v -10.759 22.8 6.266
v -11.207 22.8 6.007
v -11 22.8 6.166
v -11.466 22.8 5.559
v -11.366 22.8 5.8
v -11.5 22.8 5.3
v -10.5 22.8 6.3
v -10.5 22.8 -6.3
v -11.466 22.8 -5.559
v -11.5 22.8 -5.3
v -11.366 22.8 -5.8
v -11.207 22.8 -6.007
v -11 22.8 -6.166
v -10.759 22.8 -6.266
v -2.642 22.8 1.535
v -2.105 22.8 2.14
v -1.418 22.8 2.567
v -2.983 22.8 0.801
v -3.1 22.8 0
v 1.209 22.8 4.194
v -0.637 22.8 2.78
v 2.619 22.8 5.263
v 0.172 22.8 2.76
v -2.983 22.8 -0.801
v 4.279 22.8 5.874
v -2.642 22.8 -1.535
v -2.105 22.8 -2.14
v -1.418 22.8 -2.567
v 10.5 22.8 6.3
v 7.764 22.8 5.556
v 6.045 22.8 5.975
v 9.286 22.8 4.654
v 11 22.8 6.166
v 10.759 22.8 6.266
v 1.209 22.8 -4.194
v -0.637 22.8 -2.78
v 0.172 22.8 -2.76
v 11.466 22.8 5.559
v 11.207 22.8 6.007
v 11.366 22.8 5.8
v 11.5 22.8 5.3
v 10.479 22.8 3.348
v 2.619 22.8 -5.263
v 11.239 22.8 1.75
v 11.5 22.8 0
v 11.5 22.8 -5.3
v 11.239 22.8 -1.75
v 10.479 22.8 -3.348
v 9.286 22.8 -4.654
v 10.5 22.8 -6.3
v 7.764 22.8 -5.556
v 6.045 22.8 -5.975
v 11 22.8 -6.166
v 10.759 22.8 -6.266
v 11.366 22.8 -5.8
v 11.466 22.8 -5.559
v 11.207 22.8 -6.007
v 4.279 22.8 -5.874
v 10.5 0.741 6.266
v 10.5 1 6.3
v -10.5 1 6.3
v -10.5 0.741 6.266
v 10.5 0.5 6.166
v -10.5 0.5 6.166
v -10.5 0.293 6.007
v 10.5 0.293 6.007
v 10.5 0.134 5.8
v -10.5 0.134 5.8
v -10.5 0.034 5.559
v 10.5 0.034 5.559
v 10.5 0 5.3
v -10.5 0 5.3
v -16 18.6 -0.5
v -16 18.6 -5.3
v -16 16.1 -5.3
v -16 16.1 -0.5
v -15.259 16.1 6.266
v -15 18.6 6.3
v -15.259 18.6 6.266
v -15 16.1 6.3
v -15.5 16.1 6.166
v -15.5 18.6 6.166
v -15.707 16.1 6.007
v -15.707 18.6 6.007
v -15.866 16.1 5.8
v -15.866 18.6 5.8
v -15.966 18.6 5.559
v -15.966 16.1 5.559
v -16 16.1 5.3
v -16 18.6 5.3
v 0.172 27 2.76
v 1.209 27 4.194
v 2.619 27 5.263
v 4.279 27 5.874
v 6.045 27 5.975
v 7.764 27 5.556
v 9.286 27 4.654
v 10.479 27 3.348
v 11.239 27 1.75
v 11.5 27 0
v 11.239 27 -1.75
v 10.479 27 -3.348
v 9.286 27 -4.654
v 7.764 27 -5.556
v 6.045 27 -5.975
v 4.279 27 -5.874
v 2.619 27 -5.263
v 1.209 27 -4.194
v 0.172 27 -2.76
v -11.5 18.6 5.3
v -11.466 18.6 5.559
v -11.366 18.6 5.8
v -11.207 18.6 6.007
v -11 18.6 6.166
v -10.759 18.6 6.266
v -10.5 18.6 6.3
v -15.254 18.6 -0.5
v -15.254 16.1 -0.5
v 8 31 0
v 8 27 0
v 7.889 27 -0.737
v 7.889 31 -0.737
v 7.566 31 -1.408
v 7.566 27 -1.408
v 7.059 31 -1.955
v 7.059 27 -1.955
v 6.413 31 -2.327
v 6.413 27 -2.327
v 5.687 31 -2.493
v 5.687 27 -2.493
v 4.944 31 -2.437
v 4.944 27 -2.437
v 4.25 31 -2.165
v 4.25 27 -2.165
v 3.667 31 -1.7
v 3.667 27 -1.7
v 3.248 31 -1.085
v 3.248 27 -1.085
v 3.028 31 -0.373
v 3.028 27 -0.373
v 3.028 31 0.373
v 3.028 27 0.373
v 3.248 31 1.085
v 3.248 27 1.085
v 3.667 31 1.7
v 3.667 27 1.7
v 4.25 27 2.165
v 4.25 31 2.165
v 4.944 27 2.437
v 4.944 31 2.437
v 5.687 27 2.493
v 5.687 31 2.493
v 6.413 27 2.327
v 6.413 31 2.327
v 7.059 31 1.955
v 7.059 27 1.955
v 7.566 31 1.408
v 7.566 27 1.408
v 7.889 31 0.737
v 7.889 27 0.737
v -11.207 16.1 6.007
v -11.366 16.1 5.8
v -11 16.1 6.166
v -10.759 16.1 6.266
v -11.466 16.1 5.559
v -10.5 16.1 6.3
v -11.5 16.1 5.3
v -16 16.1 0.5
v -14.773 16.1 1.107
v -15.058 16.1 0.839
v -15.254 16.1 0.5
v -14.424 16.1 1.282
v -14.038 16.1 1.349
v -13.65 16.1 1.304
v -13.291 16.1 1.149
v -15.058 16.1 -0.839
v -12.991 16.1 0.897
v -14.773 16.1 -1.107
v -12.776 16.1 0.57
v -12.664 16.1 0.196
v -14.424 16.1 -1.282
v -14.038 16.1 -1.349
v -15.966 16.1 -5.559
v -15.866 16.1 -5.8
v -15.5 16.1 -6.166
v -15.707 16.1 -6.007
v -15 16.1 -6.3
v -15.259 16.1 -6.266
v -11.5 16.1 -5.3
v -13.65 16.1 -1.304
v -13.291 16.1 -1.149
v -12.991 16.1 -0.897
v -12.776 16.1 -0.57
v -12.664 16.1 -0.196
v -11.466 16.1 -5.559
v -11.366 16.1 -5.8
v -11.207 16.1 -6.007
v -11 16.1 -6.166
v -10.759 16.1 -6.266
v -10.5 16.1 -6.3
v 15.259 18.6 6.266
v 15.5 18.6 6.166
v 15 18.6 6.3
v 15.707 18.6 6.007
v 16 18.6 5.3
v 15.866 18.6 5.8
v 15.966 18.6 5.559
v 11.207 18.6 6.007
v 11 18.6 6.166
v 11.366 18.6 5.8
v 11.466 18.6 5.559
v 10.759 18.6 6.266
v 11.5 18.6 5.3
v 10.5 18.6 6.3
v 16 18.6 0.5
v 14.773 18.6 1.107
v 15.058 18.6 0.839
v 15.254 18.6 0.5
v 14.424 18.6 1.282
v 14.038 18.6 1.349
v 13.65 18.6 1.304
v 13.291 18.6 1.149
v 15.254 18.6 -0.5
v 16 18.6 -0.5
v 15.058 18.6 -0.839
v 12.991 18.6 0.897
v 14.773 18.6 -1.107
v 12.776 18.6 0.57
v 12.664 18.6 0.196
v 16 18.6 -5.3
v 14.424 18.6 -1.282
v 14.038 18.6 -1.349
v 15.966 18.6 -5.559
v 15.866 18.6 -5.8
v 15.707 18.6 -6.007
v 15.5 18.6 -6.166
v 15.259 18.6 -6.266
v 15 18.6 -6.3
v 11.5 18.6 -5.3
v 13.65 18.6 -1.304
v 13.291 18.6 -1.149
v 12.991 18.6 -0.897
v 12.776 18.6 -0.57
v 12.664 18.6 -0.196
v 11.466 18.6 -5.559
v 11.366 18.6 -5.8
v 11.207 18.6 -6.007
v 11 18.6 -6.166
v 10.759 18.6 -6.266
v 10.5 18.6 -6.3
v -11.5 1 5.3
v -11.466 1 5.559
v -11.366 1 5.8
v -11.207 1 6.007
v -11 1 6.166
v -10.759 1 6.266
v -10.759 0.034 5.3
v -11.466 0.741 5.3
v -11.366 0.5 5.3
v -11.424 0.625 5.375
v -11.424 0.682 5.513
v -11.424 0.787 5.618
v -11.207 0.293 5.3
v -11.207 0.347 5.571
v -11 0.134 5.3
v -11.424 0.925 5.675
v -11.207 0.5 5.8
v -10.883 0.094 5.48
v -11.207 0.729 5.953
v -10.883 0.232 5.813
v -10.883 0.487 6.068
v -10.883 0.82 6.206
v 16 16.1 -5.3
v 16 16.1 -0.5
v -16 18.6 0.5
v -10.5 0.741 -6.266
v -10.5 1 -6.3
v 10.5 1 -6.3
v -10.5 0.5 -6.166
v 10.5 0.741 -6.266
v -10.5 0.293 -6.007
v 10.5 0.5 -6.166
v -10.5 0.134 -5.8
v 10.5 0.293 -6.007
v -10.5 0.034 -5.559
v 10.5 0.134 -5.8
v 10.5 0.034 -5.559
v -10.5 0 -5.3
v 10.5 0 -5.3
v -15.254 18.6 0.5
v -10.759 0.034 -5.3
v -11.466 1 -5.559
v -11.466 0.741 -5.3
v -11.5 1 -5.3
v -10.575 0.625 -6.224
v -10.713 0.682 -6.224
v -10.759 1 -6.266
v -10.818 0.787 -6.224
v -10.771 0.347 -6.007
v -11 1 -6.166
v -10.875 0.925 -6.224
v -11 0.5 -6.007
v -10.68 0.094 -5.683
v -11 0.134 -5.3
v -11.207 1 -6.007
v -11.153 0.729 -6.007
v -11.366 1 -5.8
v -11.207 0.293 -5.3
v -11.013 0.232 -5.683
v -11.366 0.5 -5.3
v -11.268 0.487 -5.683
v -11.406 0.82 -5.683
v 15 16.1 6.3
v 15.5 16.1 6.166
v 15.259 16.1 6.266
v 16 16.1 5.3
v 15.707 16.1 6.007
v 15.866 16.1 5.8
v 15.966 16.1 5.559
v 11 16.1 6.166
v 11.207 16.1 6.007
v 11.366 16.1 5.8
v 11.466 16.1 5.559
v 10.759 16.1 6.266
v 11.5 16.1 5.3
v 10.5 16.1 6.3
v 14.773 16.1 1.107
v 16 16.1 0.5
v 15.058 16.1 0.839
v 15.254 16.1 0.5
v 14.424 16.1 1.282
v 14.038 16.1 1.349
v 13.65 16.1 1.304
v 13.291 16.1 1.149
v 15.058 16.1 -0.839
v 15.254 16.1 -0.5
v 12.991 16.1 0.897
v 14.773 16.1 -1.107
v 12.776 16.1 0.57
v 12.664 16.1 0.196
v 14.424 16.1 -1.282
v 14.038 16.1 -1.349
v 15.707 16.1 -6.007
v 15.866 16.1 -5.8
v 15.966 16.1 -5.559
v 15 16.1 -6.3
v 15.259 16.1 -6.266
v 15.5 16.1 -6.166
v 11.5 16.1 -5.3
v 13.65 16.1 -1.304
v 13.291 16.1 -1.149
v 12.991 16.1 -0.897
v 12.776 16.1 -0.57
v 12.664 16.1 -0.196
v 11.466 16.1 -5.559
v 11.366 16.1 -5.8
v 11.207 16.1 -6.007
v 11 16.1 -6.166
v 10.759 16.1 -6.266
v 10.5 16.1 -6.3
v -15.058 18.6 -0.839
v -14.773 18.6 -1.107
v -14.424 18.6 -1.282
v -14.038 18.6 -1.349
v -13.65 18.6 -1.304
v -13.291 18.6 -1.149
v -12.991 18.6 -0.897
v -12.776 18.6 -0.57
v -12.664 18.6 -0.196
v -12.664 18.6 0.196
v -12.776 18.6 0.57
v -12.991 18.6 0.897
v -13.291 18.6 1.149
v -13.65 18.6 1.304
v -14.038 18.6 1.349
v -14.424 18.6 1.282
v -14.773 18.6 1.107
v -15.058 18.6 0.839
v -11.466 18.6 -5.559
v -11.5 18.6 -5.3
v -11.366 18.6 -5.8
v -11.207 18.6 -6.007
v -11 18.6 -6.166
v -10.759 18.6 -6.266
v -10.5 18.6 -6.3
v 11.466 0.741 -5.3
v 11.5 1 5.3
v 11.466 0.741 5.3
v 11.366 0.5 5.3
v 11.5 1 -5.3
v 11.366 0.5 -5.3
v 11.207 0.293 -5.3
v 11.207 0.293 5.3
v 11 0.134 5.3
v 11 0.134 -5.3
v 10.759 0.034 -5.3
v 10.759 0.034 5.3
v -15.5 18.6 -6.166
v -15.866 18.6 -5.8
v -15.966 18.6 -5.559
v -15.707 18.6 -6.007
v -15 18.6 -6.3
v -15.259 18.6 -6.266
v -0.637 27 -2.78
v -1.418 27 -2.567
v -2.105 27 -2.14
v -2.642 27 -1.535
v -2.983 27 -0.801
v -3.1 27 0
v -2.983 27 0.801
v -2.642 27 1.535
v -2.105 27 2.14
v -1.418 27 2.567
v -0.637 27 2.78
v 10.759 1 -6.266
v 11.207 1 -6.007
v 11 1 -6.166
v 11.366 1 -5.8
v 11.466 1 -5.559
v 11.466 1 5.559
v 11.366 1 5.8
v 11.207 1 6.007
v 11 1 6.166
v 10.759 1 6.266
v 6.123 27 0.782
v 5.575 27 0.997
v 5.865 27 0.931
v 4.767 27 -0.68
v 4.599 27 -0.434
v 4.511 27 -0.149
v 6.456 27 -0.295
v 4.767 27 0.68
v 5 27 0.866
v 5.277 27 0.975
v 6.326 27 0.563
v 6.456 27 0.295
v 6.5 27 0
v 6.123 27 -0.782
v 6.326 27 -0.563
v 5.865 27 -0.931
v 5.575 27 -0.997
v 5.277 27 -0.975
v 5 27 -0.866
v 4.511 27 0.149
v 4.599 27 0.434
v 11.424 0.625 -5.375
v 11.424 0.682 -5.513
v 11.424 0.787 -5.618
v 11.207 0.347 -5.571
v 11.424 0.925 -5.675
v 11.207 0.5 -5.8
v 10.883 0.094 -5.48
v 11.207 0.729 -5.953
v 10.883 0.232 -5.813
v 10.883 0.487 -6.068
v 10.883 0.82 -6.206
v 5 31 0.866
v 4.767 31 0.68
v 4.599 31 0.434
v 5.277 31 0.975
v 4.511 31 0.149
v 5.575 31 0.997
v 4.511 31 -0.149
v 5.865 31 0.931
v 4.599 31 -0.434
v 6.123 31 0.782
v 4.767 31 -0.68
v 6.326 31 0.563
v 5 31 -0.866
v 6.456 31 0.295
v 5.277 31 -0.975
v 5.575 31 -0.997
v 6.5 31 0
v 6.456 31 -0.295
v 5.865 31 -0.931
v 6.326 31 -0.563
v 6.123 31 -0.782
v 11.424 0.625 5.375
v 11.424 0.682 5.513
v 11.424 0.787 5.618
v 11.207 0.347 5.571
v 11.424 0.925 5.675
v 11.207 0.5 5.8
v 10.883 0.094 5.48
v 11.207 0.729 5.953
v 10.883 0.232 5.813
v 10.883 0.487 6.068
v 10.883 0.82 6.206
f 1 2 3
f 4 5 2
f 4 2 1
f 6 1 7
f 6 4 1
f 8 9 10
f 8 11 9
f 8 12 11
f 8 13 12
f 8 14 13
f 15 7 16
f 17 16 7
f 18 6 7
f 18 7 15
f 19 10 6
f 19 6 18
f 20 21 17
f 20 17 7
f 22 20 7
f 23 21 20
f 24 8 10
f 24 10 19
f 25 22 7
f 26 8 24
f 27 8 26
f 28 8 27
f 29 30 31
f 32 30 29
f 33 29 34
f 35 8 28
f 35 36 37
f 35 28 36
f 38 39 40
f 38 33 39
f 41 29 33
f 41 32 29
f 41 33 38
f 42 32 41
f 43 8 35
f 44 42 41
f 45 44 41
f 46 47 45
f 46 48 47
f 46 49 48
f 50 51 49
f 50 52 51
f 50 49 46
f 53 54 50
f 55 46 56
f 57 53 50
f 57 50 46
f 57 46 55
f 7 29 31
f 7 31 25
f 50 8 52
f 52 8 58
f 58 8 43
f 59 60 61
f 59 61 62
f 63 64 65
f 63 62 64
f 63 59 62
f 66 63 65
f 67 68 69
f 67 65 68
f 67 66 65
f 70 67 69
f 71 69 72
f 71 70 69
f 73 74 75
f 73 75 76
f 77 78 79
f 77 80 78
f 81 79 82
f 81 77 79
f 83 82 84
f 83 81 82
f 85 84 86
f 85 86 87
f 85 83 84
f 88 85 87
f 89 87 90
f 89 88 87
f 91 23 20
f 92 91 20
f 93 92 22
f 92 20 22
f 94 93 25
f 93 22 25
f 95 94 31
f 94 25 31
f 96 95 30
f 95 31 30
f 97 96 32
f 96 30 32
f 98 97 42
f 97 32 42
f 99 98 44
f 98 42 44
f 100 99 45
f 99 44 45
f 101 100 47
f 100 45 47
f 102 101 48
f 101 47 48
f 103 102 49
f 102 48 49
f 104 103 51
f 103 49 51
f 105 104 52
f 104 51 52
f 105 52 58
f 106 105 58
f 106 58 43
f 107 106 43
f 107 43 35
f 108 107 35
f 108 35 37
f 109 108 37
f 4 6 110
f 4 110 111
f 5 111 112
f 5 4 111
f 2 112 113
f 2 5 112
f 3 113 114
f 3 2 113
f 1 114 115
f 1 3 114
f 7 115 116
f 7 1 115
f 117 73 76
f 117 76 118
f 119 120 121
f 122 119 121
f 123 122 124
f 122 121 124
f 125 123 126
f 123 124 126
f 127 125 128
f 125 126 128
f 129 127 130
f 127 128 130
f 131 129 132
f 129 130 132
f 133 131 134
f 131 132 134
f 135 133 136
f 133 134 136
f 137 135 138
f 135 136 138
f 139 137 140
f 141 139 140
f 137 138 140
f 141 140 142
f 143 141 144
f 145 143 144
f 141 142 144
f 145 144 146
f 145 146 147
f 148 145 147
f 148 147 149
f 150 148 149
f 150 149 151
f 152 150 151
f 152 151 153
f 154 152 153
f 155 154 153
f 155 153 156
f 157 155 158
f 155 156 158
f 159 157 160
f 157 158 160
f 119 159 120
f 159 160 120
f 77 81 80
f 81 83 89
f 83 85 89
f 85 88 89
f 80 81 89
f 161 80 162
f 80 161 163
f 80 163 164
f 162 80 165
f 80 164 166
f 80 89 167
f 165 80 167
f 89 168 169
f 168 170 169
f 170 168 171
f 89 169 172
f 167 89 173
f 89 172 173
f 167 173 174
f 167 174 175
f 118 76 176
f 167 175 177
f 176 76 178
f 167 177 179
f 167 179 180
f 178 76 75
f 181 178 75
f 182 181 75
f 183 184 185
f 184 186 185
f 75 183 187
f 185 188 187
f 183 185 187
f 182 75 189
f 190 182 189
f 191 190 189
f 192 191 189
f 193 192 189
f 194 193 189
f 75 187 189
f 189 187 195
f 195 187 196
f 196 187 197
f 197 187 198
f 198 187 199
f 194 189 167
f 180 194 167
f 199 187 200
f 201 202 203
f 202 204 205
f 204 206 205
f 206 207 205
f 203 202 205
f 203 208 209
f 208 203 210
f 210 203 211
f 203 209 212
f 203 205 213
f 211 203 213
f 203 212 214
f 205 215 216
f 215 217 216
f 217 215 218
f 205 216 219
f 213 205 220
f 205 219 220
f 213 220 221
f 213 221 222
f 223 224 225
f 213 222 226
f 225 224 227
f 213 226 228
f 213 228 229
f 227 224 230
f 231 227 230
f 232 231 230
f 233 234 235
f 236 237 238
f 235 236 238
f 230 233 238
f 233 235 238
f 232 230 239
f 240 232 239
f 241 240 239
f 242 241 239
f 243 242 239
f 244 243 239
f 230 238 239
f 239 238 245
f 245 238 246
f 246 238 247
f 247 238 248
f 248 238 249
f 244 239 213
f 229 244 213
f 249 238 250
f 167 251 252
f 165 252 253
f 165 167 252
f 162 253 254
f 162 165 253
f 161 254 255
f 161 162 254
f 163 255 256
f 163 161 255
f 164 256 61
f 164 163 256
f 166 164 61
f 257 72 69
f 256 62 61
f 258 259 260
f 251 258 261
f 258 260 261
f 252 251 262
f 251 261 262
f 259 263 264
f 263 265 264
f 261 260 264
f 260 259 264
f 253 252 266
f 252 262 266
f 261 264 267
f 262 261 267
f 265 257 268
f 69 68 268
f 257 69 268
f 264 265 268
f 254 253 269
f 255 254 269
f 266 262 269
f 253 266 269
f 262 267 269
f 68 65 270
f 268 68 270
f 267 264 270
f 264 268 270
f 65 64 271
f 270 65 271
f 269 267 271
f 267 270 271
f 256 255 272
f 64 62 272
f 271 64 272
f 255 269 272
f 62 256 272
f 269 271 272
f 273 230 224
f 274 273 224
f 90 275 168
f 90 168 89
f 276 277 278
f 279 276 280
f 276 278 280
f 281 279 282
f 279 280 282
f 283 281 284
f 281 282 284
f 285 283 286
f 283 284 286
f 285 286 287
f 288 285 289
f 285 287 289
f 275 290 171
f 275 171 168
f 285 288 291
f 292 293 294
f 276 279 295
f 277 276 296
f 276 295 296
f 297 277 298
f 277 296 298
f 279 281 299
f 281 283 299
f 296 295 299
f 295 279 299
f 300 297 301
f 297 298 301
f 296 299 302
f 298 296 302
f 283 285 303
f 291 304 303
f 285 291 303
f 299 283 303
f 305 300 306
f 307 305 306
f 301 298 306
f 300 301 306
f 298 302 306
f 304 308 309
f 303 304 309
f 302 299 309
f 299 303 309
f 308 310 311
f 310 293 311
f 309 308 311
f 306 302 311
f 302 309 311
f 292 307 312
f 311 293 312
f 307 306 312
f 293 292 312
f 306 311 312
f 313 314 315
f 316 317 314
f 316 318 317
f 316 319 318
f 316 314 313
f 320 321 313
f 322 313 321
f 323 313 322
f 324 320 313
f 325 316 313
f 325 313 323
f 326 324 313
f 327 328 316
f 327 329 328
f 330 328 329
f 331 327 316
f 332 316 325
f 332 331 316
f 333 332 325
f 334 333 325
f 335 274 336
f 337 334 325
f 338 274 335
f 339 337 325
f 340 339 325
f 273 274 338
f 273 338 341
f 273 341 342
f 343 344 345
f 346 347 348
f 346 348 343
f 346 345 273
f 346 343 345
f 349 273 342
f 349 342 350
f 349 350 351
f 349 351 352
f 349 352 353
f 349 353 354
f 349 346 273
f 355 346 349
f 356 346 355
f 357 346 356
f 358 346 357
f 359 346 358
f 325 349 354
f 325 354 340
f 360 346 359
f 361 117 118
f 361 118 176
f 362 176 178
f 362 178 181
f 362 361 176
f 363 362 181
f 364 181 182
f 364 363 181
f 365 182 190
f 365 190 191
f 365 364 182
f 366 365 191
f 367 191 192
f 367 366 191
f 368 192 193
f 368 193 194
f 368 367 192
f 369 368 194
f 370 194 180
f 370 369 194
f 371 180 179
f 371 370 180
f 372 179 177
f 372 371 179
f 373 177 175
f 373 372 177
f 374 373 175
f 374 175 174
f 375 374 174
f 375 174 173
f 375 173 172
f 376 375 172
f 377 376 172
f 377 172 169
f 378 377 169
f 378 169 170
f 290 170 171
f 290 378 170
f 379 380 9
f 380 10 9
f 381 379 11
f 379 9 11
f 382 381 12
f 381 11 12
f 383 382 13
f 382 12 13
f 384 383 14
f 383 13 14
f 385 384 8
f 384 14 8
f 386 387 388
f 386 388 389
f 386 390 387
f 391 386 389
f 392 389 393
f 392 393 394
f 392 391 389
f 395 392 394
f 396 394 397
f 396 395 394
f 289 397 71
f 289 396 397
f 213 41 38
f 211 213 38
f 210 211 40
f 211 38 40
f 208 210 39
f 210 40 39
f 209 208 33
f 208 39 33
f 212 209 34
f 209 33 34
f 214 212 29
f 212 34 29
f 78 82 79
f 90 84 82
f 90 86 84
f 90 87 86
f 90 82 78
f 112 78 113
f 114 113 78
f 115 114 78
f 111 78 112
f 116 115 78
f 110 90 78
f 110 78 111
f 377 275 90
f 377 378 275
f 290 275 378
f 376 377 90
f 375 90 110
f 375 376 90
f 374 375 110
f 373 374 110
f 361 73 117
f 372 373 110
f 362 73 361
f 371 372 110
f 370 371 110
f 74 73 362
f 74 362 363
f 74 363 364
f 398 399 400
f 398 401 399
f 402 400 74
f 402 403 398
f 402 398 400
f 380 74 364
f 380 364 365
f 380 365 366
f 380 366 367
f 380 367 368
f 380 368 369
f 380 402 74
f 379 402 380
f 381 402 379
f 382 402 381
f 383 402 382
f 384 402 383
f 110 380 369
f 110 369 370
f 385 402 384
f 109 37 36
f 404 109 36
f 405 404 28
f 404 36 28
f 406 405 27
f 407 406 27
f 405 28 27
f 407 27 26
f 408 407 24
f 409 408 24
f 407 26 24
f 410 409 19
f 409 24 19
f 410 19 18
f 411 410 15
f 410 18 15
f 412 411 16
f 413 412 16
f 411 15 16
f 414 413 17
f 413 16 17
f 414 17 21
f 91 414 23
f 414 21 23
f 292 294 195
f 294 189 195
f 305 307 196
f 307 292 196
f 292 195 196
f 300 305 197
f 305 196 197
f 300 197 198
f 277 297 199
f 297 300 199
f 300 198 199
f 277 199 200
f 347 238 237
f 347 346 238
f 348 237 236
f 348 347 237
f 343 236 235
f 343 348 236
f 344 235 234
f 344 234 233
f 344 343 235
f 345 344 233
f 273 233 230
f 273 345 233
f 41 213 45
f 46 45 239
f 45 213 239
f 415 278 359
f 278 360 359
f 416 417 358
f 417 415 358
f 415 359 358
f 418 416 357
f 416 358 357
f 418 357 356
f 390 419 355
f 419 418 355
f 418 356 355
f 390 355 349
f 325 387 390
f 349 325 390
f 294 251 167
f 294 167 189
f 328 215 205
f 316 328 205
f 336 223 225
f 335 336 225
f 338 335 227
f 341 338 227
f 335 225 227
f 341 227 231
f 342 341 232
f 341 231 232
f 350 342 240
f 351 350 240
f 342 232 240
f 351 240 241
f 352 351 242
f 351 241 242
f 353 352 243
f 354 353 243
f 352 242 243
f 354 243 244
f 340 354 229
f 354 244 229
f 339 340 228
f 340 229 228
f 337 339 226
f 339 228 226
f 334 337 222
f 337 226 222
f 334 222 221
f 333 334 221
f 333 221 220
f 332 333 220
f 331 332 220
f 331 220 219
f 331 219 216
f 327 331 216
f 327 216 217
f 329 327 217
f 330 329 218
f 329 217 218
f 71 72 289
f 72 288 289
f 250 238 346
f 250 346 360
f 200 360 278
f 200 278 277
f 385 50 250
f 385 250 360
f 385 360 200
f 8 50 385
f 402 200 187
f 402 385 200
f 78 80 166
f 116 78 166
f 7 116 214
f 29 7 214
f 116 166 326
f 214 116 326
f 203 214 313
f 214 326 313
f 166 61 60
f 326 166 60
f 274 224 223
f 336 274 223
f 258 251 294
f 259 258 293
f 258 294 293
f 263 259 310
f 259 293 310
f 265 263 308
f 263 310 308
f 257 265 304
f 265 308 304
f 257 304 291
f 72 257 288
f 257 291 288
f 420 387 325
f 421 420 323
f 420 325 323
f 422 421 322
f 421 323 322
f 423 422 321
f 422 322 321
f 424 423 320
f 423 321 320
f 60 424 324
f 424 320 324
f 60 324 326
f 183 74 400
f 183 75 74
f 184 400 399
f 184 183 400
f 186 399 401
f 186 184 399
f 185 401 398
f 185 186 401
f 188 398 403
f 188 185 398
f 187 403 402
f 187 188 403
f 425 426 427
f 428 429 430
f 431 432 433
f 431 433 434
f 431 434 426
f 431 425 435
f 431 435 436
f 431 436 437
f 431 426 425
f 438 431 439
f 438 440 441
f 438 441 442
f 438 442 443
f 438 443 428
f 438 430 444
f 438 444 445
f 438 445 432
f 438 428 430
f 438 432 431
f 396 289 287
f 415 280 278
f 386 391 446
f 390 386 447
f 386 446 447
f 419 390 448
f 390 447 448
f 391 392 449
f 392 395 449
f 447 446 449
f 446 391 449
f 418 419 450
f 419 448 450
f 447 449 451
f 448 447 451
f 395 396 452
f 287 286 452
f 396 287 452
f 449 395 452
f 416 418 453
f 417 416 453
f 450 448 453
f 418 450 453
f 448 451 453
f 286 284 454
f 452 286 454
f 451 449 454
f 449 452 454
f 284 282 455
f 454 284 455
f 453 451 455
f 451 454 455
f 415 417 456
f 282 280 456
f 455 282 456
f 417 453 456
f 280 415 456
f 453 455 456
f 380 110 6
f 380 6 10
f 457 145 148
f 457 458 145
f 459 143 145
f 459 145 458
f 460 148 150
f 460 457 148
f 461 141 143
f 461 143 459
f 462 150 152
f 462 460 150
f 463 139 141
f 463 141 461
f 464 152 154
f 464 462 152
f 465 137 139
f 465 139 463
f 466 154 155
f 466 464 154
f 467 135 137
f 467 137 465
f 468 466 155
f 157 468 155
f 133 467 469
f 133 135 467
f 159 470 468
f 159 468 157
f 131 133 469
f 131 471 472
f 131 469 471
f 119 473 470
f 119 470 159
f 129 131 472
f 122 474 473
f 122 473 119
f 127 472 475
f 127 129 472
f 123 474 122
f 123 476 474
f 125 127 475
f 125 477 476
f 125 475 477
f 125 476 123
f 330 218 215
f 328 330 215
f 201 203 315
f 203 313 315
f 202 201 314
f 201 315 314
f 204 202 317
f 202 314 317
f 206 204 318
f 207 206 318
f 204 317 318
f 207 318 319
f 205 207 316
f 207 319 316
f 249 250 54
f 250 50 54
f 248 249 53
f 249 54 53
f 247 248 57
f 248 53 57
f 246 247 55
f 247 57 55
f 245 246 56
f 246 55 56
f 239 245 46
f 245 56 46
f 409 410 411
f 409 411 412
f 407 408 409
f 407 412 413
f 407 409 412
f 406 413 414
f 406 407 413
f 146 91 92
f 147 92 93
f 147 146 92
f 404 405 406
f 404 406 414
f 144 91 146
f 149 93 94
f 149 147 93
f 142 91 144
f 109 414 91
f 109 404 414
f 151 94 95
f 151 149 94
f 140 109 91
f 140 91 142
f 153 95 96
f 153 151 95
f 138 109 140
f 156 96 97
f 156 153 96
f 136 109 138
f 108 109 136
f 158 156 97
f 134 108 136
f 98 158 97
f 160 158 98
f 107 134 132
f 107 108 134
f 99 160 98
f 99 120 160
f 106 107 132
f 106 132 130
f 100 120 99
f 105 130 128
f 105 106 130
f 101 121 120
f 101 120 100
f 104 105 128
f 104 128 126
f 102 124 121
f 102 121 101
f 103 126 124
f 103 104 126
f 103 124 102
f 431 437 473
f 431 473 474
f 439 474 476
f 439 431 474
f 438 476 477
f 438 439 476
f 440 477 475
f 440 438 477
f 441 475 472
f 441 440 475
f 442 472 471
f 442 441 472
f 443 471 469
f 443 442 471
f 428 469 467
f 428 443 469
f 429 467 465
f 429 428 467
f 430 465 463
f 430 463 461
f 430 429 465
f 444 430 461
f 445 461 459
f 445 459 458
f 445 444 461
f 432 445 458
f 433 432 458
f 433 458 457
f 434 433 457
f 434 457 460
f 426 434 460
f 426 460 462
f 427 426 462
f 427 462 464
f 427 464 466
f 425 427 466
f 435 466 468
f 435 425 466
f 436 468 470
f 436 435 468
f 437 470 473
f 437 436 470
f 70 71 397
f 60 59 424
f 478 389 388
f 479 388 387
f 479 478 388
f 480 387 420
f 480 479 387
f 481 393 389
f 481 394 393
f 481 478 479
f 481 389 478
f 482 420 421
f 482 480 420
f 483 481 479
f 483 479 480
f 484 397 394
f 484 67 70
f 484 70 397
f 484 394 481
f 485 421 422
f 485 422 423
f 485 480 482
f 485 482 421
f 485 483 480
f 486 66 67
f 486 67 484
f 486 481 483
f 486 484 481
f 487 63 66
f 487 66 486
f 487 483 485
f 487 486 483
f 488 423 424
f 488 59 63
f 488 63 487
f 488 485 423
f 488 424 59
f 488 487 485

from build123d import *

# Parameters (mm, degrees)
SKETCH1_W            = 23
SKETCH1_H            = 12.6
BOSS_EXTRUDE1_DEPTH  = 22.8
BOSS_EXTRUDE2_DEPTH  = 4.2
SKETCH3_R            = 2.5
SKETCH3_R_2          = 1
EXTRUDE_THIN1_DEPTH  = 4
FILLET1_R            = 1
BOSS_EXTRUDE4_START  = -4.2
BOSS_EXTRUDE4_DEPTH  = 2.5
FILLET2_R            = 1
FILLET2_OF_MIRROR1_R = 1


with BuildPart() as part:
    # Sketch1 → Boss-Extrude1 (new body)
    with BuildSketch(Plane(origin=(0, 0, 0), x_dir=(1, 0, 0), z_dir=(0, 1, 0))):
        Rectangle(SKETCH1_W, SKETCH1_H)
    extrude(amount=BOSS_EXTRUDE1_DEPTH)

    # Sketch2 → Boss-Extrude2 (add)
    with BuildSketch(Plane(origin=(0, 22.8, 0), x_dir=(1, 0, 0), z_dir=(0, 1, 0))):
        with BuildLine():
            ThreePointArc((0.172413793, -2.759859636), (11.5, 0), (0.172413793, 2.759859636))
            ThreePointArc((0.172413793, 2.759859636), (-3.1, 0), (0.172413793, -2.759859636))
        make_face()
    extrude(amount=BOSS_EXTRUDE2_DEPTH)

    # Sketch3 → Extrude-Thin1 (add)
    with BuildSketch(Plane(origin=(0, 27, 0), x_dir=(1, 0, 0), z_dir=(0, 1, 0))):
        with Locations((5.5, 0)):
            Circle(SKETCH3_R)
        with Locations((5.5, 0)):
            Circle(SKETCH3_R_2, mode=Mode.SUBTRACT)
    extrude(amount=EXTRUDE_THIN1_DEPTH)

    # Fillet1
    fillet1_edges = [part.edges().sort_by_distance(p)[0] for p in [
        (0, 0, 6.3),
        (-11.5, 0, 0),
        (0, 0, -6.3),
        (11.5, 0, 0),
        (11.5, 11.4, 6.3),
        (-11.5, 11.4, 6.3),
        (-11.5, 11.4, -6.3),
        (11.5, 11.4, -6.3),
    ]]
    fillet(fillet1_edges, radius=FILLET1_R)

    # Sketch4 → Boss-Extrude4 (add)
    with BuildSketch(Plane(origin=(0, 22.8, 0), x_dir=(1, 0, 0), z_dir=(0, 1, 0)).offset(BOSS_EXTRUDE4_START)):
        with BuildLine():
            Line((-9.107735151, 6.3), (-16, 6.3))
            Line((-16, 6.3), (-16, 0.5))
            Line((-16, 0.5), (-15.25399362, 0.5))
            ThreePointArc((-15.25399362, 0.5), (-12.65, 0), (-15.25399362, -0.5))
            Line((-15.25399362, -0.5), (-16, -0.5))
            Line((-16, -0.5), (-16, -6.3))
            Line((-16, -6.3), (-9.107735151, -6.3))
            Line((-9.107735151, -6.3), (-9.107735151, 6.3))
        make_face()
    boss_extrude4 = extrude(amount=-BOSS_EXTRUDE4_DEPTH)

    # Fillet2
    fillet2_edges = [part.edges().sort_by_distance(p)[0] for p in [
        (-16, 17.35, -6.3),
        (-16, 17.35, 6.3),
    ]]
    fillet(fillet2_edges, radius=FILLET2_R)

    # Mirror1: Boss-Extrude4 across plane
    add(boss_extrude4.mirror(Plane(origin=(0, 0, 0), x_dir=(0, 0, 1), z_dir=(1, 0, 0))))

    # Fillet2 of Mirror1
    fillet2_of_mirror1_edges = [part.edges().sort_by_distance(p)[0] for p in [
        (16, 17.35, -6.3),
        (16, 17.35, 6.3),
    ]]
    fillet(fillet2_of_mirror1_edges, radius=FILLET2_OF_MIRROR1_R)


solid = part.part
